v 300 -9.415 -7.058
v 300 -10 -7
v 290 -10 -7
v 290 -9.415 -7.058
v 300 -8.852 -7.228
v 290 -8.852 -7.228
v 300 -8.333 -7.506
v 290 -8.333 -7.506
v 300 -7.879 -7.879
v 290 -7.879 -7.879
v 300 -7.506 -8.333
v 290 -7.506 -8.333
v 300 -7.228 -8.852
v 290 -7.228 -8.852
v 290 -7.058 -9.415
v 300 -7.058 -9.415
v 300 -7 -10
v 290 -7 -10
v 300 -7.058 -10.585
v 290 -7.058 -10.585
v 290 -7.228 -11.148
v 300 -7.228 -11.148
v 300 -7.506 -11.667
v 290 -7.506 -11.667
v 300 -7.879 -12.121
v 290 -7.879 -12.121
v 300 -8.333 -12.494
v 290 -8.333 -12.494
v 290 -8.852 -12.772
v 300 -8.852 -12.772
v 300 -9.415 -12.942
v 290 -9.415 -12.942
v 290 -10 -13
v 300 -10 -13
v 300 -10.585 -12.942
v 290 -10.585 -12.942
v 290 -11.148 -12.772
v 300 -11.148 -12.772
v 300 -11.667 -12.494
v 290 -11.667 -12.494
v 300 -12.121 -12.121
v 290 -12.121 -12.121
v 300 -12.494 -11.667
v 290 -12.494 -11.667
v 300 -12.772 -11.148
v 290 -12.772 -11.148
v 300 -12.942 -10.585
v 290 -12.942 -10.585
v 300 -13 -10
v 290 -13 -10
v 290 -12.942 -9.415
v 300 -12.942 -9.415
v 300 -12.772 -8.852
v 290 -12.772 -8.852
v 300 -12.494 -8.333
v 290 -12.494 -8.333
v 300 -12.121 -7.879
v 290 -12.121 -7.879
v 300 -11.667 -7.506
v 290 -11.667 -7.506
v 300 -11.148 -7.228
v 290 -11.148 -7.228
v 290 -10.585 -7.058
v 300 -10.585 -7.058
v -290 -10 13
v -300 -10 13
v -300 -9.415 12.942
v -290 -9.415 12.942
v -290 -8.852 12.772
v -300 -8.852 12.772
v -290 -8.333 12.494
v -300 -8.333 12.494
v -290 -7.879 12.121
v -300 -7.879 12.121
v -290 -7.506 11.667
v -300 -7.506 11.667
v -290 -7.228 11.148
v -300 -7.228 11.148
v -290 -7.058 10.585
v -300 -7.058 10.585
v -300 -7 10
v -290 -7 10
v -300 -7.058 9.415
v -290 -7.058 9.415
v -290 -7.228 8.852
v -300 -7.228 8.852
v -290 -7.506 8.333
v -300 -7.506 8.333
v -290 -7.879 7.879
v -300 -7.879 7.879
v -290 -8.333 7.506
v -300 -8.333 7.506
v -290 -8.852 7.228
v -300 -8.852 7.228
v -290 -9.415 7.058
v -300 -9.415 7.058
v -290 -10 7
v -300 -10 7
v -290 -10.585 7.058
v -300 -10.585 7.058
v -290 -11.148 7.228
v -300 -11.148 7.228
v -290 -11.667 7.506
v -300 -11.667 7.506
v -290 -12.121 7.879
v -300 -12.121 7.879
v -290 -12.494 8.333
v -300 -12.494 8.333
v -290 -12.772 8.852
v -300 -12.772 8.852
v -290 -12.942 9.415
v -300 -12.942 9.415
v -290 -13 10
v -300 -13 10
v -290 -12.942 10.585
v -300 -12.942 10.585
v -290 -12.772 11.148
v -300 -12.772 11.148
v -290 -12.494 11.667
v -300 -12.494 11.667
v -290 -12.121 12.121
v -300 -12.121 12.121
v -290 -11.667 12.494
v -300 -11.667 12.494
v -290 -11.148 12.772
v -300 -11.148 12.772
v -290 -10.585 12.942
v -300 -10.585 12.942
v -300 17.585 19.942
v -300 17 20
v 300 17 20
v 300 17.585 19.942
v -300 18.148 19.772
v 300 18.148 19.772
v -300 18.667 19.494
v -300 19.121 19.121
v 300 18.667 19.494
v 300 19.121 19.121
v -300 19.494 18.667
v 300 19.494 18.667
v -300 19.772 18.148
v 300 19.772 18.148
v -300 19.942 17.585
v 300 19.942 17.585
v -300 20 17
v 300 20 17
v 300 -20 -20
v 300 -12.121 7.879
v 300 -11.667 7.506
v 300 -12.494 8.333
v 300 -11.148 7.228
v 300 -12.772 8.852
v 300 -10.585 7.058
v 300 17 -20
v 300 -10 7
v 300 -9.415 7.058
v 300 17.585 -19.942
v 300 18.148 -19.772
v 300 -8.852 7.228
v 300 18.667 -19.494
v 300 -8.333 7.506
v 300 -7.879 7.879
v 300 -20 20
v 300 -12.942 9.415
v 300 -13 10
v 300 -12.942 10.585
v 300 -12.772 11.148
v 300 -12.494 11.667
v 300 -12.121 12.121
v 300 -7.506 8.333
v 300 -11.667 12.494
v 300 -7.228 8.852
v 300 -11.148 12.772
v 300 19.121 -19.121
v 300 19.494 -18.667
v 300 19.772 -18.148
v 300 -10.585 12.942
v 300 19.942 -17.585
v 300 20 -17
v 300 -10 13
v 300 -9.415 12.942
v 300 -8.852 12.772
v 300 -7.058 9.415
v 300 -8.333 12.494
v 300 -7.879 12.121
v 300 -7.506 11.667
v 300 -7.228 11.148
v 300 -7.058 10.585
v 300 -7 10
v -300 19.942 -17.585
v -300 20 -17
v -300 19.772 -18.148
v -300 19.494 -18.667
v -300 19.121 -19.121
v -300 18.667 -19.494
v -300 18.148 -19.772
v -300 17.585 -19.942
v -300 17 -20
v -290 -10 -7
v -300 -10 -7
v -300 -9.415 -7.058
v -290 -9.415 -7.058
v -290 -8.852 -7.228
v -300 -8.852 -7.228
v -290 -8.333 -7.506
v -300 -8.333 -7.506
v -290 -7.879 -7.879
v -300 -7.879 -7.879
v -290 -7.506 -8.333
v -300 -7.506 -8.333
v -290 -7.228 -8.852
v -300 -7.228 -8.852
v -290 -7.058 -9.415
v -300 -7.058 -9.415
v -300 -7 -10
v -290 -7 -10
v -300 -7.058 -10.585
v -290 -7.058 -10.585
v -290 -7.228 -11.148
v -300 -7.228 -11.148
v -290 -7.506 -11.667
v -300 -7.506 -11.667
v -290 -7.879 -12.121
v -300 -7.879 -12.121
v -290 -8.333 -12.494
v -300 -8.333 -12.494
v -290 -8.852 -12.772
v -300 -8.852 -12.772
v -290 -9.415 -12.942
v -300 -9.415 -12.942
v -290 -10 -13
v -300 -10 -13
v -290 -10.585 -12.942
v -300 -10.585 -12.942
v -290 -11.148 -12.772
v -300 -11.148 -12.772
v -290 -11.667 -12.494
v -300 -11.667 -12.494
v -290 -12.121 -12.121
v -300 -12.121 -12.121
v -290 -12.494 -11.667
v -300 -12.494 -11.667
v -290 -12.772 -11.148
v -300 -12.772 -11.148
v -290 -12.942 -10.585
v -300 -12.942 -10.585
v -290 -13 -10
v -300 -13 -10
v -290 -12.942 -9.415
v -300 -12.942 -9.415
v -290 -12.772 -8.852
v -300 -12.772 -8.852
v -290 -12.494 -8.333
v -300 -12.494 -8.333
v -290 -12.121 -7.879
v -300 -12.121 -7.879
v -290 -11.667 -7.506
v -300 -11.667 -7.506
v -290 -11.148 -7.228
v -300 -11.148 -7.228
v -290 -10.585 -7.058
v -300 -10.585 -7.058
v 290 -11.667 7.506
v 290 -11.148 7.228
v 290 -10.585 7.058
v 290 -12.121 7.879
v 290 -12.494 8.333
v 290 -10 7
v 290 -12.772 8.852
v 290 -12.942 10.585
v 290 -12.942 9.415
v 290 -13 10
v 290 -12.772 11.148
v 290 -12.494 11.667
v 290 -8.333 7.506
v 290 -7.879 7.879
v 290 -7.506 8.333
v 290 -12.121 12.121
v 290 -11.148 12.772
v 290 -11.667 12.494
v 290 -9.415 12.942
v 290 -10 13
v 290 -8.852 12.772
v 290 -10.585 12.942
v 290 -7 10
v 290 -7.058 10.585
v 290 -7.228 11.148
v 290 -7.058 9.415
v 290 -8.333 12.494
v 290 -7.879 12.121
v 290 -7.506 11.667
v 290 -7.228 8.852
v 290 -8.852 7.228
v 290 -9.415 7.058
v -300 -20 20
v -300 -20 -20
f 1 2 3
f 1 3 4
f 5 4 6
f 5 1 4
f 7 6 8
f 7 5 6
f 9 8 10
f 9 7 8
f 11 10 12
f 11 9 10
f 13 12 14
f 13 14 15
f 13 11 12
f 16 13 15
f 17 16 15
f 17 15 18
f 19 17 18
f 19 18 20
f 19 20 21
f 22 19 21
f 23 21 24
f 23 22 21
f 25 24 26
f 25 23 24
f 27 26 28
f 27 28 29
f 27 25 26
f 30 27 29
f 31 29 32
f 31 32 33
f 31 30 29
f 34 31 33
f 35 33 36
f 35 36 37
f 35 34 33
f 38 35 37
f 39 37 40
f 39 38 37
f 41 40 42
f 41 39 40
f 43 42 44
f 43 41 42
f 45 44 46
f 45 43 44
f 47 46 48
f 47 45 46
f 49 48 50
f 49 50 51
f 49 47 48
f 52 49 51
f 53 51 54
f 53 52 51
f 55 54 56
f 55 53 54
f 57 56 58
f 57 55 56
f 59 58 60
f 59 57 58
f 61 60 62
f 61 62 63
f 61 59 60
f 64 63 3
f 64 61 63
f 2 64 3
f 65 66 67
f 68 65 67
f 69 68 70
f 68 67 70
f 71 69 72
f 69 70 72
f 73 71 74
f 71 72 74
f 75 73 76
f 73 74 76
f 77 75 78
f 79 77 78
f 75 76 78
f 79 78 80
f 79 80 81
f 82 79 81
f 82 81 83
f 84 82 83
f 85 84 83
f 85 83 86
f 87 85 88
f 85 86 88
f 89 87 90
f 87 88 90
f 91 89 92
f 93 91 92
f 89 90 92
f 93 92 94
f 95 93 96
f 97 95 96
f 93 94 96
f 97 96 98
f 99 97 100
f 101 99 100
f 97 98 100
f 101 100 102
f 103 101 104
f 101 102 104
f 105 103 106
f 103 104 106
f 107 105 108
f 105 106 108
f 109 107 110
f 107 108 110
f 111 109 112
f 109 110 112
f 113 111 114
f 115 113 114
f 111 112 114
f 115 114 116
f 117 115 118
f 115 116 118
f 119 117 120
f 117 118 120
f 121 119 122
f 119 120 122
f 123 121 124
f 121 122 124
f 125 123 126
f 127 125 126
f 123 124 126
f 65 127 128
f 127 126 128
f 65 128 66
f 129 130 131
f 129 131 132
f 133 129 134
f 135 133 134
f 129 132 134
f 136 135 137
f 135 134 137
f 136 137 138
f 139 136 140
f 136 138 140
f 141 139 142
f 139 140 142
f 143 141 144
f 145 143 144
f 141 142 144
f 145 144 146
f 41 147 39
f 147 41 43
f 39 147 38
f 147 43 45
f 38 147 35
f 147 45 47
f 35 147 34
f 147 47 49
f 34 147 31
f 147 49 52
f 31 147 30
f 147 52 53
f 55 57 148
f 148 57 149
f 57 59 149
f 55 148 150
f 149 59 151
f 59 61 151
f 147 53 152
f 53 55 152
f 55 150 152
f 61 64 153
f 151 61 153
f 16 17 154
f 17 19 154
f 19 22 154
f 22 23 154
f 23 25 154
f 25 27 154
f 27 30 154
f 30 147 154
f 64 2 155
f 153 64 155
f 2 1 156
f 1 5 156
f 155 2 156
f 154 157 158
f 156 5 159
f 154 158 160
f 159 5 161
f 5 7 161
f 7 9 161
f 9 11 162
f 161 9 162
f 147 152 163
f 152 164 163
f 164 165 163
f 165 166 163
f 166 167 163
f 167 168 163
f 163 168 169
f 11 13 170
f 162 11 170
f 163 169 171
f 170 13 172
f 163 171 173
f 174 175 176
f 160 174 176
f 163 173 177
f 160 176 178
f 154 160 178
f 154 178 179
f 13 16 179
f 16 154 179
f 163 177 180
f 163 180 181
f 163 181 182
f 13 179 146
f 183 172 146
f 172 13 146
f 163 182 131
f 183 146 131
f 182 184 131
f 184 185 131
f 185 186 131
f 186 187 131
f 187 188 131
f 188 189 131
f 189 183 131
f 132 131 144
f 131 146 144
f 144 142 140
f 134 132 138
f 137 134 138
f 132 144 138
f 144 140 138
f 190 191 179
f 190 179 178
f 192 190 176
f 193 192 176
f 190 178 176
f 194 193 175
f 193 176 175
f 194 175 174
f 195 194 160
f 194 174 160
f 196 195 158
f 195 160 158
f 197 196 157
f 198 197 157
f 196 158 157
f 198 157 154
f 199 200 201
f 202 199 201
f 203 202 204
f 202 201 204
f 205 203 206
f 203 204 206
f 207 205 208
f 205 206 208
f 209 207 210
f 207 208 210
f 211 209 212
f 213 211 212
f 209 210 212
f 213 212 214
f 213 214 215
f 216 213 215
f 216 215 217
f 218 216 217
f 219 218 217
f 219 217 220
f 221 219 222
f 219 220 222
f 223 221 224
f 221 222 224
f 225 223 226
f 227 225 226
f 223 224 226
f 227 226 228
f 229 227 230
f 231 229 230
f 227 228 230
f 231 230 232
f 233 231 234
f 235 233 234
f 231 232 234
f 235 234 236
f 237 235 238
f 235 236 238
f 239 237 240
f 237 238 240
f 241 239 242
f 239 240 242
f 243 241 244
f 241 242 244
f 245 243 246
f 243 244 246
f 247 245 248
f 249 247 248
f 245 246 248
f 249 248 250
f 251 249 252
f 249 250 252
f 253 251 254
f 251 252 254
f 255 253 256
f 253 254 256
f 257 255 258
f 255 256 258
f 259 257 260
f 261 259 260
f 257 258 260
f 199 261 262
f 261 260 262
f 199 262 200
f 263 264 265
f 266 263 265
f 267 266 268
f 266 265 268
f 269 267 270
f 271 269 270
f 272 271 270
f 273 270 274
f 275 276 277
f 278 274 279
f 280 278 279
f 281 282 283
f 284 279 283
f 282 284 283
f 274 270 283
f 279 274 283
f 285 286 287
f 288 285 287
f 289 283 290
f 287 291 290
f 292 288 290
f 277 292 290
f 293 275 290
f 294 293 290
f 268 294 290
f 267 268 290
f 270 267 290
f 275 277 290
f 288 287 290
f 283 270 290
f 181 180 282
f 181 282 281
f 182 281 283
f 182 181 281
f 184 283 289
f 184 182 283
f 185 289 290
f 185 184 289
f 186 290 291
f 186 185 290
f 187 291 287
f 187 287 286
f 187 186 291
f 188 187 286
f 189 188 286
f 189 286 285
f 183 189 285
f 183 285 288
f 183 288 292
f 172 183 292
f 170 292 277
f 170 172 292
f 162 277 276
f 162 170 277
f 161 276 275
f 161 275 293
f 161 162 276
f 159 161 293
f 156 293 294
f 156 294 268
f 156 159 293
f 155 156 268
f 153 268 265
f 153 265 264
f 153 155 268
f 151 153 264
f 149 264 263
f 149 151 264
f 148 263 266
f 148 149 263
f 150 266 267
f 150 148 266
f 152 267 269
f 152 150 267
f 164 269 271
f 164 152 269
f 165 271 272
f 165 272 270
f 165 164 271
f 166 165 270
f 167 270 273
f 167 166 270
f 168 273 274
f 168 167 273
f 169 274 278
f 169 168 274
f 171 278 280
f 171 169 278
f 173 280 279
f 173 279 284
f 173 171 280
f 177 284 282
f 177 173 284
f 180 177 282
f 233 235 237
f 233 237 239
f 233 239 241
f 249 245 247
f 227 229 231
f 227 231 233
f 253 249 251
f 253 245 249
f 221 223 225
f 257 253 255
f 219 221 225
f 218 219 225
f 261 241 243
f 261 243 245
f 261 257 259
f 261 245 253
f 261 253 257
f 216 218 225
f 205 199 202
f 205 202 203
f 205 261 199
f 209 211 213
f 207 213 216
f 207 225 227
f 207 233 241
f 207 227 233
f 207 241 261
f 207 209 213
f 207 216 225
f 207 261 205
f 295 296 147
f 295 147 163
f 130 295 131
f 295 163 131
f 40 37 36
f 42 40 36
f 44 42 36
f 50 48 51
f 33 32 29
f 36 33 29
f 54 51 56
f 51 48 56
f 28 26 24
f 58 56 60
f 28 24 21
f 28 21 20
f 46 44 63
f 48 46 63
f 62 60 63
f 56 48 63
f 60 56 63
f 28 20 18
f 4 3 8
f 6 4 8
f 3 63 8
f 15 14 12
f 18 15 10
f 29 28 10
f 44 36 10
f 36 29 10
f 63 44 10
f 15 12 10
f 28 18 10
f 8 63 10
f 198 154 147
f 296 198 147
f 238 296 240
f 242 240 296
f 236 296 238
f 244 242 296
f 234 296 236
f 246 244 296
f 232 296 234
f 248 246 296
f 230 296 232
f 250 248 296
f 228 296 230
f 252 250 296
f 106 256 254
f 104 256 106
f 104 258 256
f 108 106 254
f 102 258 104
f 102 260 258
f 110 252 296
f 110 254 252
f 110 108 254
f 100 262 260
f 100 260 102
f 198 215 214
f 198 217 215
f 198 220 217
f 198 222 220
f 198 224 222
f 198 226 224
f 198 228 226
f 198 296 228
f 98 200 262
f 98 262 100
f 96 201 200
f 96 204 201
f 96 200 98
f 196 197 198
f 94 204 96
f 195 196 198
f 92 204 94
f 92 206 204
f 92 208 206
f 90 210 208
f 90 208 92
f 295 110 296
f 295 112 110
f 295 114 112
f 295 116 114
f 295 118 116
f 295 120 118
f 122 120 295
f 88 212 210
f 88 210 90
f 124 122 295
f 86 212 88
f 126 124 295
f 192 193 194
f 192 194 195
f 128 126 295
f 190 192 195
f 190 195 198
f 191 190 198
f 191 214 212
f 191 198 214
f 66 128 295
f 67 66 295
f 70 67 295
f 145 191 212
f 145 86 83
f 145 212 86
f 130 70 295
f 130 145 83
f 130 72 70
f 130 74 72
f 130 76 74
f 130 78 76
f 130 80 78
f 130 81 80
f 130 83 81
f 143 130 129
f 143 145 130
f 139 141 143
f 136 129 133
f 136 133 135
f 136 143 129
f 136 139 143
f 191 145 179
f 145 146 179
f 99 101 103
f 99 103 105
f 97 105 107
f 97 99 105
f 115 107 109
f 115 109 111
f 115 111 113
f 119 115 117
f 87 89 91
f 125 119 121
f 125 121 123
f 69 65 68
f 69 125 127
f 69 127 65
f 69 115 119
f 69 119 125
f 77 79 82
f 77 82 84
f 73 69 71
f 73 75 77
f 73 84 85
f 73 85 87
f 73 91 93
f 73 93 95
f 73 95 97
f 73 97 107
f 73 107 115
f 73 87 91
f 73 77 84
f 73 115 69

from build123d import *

# Parameters (mm, degrees)
SALIENTE_EXTRUIR1_DEPTH = 300
CROQUIS2_R              = 3
CORTAR_EXTRUIR1_DEPTH   = 10


with BuildPart() as part:
    # Croquis1 → Saliente-Extruir1 (new, symmetric)
    with BuildSketch(Plane(origin=(0, 0, 0), x_dir=(0, 0, -1), z_dir=(1, 0, 0))):
        with BuildLine():
            Line((20, -20), (-20, -20))
            Line((-20, -20), (-20, 17))
            ThreePointArc((-20, 17), (-19.121320344, 19.121320344), (-17, 20))
            Line((-17, 20), (17, 20))
            ThreePointArc((17, 20), (19.121320344, 19.121320344), (20, 17))
            Line((20, 17), (20, -20))
        make_face()
    extrude(amount=SALIENTE_EXTRUIR1_DEPTH, both=True)

    # Croquis2 → Cortar-Extruir1 (cut)
    with BuildSketch(Plane.ZY.offset(300)):
        with Locations((-10, -10)):
            Circle(CROQUIS2_R)
        with Locations((10, -10)):
            Circle(CROQUIS2_R)
    cortar_extruir1 = extrude(amount=-CORTAR_EXTRUIR1_DEPTH, mode=Mode.SUBTRACT)

    # Simetría1: Cortar-Extruir1 across plane
    add(cortar_extruir1.mirror(Plane(origin=(0, 0, 0), x_dir=(0, 0, 1), z_dir=(1, 0, 0))), mode=Mode.SUBTRACT)


solid = part.part
